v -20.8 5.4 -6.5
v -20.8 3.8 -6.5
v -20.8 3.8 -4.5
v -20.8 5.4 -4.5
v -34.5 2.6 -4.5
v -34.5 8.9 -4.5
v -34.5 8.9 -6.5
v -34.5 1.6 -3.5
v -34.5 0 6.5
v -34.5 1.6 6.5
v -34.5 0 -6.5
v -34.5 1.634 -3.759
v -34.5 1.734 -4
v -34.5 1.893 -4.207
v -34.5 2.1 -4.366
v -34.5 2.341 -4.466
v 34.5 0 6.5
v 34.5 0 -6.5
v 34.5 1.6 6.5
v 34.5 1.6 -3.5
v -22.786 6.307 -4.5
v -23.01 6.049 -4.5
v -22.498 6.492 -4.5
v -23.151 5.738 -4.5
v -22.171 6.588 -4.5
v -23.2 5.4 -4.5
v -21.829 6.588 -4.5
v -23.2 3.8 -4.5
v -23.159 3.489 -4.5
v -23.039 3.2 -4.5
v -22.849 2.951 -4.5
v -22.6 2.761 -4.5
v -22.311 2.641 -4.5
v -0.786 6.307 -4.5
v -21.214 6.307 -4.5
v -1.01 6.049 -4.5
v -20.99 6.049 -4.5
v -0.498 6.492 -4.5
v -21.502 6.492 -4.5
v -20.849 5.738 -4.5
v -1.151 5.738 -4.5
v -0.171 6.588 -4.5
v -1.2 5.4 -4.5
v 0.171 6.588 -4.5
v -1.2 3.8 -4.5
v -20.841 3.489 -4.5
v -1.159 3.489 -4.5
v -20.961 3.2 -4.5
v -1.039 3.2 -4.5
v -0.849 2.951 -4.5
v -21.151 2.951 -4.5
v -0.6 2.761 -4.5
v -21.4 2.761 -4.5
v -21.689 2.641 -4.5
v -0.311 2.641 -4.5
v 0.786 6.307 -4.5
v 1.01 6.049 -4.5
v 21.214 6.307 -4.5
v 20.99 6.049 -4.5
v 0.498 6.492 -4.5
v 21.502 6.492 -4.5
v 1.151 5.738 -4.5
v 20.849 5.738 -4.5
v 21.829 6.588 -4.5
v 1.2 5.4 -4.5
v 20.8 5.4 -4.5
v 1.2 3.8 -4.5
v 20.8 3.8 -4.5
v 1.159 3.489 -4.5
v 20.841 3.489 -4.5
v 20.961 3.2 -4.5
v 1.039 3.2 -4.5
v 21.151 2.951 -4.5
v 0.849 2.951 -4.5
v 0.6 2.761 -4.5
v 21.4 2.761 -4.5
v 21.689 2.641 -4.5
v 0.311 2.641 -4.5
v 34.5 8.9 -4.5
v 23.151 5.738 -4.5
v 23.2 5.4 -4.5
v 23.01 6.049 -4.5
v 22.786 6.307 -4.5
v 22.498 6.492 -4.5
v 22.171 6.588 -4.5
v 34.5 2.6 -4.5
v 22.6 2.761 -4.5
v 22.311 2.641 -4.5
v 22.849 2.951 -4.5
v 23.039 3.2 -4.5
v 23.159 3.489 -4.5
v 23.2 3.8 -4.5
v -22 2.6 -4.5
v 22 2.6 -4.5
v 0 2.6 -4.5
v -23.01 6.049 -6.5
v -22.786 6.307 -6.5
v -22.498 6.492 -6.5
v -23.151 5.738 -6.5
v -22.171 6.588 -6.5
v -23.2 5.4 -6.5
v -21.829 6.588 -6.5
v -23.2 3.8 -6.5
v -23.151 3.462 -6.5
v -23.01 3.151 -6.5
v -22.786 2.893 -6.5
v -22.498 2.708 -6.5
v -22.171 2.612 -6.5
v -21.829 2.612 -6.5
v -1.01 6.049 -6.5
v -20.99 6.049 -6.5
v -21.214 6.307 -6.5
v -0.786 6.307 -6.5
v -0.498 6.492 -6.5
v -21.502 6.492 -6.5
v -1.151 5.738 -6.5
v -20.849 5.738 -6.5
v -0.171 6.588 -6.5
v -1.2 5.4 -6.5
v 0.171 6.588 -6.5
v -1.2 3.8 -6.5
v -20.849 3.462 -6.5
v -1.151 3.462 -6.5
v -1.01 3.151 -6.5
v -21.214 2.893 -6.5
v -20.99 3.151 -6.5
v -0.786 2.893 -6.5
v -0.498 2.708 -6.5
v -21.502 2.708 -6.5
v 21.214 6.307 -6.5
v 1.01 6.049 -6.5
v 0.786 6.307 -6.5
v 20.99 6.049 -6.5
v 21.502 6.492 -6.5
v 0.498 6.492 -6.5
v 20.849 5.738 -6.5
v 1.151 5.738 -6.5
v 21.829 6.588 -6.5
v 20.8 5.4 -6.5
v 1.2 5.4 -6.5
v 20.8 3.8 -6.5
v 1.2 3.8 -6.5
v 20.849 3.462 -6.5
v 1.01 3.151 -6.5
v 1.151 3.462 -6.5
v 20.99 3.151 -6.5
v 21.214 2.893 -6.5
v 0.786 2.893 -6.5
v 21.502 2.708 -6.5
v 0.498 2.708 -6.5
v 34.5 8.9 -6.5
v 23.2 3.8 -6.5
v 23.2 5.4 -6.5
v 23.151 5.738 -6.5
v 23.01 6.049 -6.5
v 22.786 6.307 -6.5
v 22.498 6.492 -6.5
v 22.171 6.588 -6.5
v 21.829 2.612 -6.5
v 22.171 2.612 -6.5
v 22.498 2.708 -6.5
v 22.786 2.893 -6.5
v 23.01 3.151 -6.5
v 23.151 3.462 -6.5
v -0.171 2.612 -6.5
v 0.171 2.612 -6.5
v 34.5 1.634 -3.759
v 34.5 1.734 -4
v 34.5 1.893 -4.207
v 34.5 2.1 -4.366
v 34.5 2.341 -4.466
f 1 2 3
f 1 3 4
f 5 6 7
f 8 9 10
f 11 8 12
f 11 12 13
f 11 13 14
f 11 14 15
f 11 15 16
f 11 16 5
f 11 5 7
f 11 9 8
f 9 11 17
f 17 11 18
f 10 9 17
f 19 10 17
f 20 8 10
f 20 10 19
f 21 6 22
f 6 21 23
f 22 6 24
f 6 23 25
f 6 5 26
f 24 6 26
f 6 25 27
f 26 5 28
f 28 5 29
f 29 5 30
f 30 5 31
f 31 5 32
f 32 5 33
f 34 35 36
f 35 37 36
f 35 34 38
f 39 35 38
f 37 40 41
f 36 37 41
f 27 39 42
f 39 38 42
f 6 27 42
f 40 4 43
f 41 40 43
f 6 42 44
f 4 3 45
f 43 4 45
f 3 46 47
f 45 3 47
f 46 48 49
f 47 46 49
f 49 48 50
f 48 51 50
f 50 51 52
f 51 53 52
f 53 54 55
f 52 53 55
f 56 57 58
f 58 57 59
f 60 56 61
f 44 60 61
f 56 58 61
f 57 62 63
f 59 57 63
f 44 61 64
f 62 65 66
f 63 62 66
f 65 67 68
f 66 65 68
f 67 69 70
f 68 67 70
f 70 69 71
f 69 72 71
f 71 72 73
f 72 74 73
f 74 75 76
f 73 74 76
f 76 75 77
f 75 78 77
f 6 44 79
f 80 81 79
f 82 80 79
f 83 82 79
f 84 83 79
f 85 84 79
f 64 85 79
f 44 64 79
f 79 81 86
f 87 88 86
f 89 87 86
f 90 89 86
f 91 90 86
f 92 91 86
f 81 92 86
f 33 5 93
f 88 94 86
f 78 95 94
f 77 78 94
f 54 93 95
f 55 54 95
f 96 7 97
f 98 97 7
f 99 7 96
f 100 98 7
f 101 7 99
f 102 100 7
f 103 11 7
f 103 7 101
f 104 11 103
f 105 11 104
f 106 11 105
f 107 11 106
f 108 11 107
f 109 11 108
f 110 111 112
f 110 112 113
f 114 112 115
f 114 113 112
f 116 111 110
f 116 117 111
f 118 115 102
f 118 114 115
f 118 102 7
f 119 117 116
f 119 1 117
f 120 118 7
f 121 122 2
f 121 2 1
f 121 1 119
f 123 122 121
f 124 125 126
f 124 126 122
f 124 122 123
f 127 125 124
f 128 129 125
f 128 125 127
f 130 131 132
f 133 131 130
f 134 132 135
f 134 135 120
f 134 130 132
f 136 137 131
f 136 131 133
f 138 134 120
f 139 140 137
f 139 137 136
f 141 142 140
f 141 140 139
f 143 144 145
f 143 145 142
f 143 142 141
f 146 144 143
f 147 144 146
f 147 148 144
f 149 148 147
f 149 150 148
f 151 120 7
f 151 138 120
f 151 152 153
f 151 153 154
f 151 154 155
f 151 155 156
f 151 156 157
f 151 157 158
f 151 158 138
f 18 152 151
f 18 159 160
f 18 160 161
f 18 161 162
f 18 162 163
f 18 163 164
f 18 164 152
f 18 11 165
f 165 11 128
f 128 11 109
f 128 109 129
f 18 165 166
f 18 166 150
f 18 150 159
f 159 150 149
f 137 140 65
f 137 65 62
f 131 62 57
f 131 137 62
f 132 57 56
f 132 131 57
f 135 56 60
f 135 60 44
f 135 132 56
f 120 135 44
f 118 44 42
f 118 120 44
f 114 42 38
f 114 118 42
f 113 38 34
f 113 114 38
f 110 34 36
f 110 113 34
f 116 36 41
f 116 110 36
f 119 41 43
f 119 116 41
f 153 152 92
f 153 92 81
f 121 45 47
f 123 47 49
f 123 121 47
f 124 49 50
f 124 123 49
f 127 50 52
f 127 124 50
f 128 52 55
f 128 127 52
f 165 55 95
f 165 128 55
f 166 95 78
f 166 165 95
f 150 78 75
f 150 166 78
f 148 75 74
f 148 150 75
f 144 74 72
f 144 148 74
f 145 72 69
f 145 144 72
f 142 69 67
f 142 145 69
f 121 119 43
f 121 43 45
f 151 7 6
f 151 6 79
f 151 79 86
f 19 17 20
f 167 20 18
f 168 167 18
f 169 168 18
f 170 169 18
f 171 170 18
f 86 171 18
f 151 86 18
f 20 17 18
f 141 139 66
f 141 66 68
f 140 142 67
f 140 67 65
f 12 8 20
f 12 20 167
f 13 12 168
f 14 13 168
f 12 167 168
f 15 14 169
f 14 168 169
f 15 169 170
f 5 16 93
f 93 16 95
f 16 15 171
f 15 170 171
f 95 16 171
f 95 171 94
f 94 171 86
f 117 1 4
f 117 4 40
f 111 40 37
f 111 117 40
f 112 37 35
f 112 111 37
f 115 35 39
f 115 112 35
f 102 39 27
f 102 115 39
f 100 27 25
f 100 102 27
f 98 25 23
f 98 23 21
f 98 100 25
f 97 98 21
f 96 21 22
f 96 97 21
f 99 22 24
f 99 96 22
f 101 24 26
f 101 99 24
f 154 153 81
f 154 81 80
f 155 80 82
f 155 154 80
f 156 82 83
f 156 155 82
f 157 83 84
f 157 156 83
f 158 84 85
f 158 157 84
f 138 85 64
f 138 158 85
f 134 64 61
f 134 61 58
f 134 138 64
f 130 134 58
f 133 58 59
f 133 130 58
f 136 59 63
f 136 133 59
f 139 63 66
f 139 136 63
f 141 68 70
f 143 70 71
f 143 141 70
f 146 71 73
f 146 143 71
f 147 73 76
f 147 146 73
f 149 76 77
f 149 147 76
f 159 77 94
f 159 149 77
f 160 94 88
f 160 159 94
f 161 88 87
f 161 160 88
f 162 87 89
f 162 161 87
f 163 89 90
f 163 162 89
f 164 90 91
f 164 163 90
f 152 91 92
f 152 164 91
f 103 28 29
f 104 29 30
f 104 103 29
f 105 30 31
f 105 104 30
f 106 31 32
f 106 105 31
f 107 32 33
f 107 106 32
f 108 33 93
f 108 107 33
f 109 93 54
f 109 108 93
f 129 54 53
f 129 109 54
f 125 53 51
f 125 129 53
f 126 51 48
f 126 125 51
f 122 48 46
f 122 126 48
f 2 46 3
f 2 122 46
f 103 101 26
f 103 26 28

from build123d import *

# Parameters (mm, degrees)
SKETCH1_W                = 69
SKETCH1_H                = 13
BOSS_EXTRUDE1_DEPTH      = 1.6
SKETCH2_W                = 69
SKETCH2_H                = 2
BOSS_EXTRUDE2_DEPTH      = 7.3
FILLET1_R                = 1
M2_START                 = -6.5
M2_CLEARANCE_SLOT1_DEPTH = 2


# Read off the part's stored shape, not the designer's step: M2 Clearance Slot1
with BuildPart() as part:
    # Sketch1 → Boss-Extrude1 (new body)
    with BuildSketch(Plane(origin=(0, 0, 0), x_dir=(1, 0, 0), z_dir=(0, 1, 0))):
        Rectangle(SKETCH1_W, SKETCH1_H)
    extrude(amount=BOSS_EXTRUDE1_DEPTH)

    # Sketch2 → Boss-Extrude2 (add)
    with BuildSketch(Plane(origin=(0, 1.6, 0), x_dir=(1, 0, 0), z_dir=(0, 1, 0))):
        with Locations((0, 5.5)):
            Rectangle(SKETCH2_W, SKETCH2_H)
    extrude(amount=BOSS_EXTRUDE2_DEPTH)

    # Fillet1
    fillet1_edges = [part.edges().sort_by_distance(p)[0] for p in [
        (0, 1.6, -4.5),
    ]]
    fillet(fillet1_edges, radius=FILLET1_R)

    # M2 Clearance Slot1 outline → M2 Clearance Slot1 (cut)
    with BuildSketch(Plane.XY.offset(M2_START)):
        with BuildLine():
            Line((23.2, 3.8), (23.2, 5.4))
            ThreePointArc((23.2, 5.4), (22, 6.6), (20.8, 5.4))
            Line((20.8, 5.4), (20.8, 3.8))
            ThreePointArc((20.8, 3.8), (22, 2.6), (23.2, 3.8))
        make_face()
        with BuildLine():
            Line((1.2, 3.8), (1.2, 5.4))
            ThreePointArc((1.2, 5.4), (0, 6.6), (-1.2, 5.4))
            Line((-1.2, 5.4), (-1.2, 3.8))
            ThreePointArc((-1.2, 3.8), (0, 2.6), (1.2, 3.8))
        make_face()
        with BuildLine():
            Line((-20.8, 3.8), (-20.8, 5.4))
            ThreePointArc((-20.8, 5.4), (-22, 6.6), (-23.2, 5.4))
            Line((-23.2, 5.4), (-23.2, 3.8))
            ThreePointArc((-23.2, 3.8), (-22, 2.6), (-20.8, 3.8))
        make_face()
    extrude(amount=M2_CLEARANCE_SLOT1_DEPTH, mode=Mode.SUBTRACT)


solid = part.part
